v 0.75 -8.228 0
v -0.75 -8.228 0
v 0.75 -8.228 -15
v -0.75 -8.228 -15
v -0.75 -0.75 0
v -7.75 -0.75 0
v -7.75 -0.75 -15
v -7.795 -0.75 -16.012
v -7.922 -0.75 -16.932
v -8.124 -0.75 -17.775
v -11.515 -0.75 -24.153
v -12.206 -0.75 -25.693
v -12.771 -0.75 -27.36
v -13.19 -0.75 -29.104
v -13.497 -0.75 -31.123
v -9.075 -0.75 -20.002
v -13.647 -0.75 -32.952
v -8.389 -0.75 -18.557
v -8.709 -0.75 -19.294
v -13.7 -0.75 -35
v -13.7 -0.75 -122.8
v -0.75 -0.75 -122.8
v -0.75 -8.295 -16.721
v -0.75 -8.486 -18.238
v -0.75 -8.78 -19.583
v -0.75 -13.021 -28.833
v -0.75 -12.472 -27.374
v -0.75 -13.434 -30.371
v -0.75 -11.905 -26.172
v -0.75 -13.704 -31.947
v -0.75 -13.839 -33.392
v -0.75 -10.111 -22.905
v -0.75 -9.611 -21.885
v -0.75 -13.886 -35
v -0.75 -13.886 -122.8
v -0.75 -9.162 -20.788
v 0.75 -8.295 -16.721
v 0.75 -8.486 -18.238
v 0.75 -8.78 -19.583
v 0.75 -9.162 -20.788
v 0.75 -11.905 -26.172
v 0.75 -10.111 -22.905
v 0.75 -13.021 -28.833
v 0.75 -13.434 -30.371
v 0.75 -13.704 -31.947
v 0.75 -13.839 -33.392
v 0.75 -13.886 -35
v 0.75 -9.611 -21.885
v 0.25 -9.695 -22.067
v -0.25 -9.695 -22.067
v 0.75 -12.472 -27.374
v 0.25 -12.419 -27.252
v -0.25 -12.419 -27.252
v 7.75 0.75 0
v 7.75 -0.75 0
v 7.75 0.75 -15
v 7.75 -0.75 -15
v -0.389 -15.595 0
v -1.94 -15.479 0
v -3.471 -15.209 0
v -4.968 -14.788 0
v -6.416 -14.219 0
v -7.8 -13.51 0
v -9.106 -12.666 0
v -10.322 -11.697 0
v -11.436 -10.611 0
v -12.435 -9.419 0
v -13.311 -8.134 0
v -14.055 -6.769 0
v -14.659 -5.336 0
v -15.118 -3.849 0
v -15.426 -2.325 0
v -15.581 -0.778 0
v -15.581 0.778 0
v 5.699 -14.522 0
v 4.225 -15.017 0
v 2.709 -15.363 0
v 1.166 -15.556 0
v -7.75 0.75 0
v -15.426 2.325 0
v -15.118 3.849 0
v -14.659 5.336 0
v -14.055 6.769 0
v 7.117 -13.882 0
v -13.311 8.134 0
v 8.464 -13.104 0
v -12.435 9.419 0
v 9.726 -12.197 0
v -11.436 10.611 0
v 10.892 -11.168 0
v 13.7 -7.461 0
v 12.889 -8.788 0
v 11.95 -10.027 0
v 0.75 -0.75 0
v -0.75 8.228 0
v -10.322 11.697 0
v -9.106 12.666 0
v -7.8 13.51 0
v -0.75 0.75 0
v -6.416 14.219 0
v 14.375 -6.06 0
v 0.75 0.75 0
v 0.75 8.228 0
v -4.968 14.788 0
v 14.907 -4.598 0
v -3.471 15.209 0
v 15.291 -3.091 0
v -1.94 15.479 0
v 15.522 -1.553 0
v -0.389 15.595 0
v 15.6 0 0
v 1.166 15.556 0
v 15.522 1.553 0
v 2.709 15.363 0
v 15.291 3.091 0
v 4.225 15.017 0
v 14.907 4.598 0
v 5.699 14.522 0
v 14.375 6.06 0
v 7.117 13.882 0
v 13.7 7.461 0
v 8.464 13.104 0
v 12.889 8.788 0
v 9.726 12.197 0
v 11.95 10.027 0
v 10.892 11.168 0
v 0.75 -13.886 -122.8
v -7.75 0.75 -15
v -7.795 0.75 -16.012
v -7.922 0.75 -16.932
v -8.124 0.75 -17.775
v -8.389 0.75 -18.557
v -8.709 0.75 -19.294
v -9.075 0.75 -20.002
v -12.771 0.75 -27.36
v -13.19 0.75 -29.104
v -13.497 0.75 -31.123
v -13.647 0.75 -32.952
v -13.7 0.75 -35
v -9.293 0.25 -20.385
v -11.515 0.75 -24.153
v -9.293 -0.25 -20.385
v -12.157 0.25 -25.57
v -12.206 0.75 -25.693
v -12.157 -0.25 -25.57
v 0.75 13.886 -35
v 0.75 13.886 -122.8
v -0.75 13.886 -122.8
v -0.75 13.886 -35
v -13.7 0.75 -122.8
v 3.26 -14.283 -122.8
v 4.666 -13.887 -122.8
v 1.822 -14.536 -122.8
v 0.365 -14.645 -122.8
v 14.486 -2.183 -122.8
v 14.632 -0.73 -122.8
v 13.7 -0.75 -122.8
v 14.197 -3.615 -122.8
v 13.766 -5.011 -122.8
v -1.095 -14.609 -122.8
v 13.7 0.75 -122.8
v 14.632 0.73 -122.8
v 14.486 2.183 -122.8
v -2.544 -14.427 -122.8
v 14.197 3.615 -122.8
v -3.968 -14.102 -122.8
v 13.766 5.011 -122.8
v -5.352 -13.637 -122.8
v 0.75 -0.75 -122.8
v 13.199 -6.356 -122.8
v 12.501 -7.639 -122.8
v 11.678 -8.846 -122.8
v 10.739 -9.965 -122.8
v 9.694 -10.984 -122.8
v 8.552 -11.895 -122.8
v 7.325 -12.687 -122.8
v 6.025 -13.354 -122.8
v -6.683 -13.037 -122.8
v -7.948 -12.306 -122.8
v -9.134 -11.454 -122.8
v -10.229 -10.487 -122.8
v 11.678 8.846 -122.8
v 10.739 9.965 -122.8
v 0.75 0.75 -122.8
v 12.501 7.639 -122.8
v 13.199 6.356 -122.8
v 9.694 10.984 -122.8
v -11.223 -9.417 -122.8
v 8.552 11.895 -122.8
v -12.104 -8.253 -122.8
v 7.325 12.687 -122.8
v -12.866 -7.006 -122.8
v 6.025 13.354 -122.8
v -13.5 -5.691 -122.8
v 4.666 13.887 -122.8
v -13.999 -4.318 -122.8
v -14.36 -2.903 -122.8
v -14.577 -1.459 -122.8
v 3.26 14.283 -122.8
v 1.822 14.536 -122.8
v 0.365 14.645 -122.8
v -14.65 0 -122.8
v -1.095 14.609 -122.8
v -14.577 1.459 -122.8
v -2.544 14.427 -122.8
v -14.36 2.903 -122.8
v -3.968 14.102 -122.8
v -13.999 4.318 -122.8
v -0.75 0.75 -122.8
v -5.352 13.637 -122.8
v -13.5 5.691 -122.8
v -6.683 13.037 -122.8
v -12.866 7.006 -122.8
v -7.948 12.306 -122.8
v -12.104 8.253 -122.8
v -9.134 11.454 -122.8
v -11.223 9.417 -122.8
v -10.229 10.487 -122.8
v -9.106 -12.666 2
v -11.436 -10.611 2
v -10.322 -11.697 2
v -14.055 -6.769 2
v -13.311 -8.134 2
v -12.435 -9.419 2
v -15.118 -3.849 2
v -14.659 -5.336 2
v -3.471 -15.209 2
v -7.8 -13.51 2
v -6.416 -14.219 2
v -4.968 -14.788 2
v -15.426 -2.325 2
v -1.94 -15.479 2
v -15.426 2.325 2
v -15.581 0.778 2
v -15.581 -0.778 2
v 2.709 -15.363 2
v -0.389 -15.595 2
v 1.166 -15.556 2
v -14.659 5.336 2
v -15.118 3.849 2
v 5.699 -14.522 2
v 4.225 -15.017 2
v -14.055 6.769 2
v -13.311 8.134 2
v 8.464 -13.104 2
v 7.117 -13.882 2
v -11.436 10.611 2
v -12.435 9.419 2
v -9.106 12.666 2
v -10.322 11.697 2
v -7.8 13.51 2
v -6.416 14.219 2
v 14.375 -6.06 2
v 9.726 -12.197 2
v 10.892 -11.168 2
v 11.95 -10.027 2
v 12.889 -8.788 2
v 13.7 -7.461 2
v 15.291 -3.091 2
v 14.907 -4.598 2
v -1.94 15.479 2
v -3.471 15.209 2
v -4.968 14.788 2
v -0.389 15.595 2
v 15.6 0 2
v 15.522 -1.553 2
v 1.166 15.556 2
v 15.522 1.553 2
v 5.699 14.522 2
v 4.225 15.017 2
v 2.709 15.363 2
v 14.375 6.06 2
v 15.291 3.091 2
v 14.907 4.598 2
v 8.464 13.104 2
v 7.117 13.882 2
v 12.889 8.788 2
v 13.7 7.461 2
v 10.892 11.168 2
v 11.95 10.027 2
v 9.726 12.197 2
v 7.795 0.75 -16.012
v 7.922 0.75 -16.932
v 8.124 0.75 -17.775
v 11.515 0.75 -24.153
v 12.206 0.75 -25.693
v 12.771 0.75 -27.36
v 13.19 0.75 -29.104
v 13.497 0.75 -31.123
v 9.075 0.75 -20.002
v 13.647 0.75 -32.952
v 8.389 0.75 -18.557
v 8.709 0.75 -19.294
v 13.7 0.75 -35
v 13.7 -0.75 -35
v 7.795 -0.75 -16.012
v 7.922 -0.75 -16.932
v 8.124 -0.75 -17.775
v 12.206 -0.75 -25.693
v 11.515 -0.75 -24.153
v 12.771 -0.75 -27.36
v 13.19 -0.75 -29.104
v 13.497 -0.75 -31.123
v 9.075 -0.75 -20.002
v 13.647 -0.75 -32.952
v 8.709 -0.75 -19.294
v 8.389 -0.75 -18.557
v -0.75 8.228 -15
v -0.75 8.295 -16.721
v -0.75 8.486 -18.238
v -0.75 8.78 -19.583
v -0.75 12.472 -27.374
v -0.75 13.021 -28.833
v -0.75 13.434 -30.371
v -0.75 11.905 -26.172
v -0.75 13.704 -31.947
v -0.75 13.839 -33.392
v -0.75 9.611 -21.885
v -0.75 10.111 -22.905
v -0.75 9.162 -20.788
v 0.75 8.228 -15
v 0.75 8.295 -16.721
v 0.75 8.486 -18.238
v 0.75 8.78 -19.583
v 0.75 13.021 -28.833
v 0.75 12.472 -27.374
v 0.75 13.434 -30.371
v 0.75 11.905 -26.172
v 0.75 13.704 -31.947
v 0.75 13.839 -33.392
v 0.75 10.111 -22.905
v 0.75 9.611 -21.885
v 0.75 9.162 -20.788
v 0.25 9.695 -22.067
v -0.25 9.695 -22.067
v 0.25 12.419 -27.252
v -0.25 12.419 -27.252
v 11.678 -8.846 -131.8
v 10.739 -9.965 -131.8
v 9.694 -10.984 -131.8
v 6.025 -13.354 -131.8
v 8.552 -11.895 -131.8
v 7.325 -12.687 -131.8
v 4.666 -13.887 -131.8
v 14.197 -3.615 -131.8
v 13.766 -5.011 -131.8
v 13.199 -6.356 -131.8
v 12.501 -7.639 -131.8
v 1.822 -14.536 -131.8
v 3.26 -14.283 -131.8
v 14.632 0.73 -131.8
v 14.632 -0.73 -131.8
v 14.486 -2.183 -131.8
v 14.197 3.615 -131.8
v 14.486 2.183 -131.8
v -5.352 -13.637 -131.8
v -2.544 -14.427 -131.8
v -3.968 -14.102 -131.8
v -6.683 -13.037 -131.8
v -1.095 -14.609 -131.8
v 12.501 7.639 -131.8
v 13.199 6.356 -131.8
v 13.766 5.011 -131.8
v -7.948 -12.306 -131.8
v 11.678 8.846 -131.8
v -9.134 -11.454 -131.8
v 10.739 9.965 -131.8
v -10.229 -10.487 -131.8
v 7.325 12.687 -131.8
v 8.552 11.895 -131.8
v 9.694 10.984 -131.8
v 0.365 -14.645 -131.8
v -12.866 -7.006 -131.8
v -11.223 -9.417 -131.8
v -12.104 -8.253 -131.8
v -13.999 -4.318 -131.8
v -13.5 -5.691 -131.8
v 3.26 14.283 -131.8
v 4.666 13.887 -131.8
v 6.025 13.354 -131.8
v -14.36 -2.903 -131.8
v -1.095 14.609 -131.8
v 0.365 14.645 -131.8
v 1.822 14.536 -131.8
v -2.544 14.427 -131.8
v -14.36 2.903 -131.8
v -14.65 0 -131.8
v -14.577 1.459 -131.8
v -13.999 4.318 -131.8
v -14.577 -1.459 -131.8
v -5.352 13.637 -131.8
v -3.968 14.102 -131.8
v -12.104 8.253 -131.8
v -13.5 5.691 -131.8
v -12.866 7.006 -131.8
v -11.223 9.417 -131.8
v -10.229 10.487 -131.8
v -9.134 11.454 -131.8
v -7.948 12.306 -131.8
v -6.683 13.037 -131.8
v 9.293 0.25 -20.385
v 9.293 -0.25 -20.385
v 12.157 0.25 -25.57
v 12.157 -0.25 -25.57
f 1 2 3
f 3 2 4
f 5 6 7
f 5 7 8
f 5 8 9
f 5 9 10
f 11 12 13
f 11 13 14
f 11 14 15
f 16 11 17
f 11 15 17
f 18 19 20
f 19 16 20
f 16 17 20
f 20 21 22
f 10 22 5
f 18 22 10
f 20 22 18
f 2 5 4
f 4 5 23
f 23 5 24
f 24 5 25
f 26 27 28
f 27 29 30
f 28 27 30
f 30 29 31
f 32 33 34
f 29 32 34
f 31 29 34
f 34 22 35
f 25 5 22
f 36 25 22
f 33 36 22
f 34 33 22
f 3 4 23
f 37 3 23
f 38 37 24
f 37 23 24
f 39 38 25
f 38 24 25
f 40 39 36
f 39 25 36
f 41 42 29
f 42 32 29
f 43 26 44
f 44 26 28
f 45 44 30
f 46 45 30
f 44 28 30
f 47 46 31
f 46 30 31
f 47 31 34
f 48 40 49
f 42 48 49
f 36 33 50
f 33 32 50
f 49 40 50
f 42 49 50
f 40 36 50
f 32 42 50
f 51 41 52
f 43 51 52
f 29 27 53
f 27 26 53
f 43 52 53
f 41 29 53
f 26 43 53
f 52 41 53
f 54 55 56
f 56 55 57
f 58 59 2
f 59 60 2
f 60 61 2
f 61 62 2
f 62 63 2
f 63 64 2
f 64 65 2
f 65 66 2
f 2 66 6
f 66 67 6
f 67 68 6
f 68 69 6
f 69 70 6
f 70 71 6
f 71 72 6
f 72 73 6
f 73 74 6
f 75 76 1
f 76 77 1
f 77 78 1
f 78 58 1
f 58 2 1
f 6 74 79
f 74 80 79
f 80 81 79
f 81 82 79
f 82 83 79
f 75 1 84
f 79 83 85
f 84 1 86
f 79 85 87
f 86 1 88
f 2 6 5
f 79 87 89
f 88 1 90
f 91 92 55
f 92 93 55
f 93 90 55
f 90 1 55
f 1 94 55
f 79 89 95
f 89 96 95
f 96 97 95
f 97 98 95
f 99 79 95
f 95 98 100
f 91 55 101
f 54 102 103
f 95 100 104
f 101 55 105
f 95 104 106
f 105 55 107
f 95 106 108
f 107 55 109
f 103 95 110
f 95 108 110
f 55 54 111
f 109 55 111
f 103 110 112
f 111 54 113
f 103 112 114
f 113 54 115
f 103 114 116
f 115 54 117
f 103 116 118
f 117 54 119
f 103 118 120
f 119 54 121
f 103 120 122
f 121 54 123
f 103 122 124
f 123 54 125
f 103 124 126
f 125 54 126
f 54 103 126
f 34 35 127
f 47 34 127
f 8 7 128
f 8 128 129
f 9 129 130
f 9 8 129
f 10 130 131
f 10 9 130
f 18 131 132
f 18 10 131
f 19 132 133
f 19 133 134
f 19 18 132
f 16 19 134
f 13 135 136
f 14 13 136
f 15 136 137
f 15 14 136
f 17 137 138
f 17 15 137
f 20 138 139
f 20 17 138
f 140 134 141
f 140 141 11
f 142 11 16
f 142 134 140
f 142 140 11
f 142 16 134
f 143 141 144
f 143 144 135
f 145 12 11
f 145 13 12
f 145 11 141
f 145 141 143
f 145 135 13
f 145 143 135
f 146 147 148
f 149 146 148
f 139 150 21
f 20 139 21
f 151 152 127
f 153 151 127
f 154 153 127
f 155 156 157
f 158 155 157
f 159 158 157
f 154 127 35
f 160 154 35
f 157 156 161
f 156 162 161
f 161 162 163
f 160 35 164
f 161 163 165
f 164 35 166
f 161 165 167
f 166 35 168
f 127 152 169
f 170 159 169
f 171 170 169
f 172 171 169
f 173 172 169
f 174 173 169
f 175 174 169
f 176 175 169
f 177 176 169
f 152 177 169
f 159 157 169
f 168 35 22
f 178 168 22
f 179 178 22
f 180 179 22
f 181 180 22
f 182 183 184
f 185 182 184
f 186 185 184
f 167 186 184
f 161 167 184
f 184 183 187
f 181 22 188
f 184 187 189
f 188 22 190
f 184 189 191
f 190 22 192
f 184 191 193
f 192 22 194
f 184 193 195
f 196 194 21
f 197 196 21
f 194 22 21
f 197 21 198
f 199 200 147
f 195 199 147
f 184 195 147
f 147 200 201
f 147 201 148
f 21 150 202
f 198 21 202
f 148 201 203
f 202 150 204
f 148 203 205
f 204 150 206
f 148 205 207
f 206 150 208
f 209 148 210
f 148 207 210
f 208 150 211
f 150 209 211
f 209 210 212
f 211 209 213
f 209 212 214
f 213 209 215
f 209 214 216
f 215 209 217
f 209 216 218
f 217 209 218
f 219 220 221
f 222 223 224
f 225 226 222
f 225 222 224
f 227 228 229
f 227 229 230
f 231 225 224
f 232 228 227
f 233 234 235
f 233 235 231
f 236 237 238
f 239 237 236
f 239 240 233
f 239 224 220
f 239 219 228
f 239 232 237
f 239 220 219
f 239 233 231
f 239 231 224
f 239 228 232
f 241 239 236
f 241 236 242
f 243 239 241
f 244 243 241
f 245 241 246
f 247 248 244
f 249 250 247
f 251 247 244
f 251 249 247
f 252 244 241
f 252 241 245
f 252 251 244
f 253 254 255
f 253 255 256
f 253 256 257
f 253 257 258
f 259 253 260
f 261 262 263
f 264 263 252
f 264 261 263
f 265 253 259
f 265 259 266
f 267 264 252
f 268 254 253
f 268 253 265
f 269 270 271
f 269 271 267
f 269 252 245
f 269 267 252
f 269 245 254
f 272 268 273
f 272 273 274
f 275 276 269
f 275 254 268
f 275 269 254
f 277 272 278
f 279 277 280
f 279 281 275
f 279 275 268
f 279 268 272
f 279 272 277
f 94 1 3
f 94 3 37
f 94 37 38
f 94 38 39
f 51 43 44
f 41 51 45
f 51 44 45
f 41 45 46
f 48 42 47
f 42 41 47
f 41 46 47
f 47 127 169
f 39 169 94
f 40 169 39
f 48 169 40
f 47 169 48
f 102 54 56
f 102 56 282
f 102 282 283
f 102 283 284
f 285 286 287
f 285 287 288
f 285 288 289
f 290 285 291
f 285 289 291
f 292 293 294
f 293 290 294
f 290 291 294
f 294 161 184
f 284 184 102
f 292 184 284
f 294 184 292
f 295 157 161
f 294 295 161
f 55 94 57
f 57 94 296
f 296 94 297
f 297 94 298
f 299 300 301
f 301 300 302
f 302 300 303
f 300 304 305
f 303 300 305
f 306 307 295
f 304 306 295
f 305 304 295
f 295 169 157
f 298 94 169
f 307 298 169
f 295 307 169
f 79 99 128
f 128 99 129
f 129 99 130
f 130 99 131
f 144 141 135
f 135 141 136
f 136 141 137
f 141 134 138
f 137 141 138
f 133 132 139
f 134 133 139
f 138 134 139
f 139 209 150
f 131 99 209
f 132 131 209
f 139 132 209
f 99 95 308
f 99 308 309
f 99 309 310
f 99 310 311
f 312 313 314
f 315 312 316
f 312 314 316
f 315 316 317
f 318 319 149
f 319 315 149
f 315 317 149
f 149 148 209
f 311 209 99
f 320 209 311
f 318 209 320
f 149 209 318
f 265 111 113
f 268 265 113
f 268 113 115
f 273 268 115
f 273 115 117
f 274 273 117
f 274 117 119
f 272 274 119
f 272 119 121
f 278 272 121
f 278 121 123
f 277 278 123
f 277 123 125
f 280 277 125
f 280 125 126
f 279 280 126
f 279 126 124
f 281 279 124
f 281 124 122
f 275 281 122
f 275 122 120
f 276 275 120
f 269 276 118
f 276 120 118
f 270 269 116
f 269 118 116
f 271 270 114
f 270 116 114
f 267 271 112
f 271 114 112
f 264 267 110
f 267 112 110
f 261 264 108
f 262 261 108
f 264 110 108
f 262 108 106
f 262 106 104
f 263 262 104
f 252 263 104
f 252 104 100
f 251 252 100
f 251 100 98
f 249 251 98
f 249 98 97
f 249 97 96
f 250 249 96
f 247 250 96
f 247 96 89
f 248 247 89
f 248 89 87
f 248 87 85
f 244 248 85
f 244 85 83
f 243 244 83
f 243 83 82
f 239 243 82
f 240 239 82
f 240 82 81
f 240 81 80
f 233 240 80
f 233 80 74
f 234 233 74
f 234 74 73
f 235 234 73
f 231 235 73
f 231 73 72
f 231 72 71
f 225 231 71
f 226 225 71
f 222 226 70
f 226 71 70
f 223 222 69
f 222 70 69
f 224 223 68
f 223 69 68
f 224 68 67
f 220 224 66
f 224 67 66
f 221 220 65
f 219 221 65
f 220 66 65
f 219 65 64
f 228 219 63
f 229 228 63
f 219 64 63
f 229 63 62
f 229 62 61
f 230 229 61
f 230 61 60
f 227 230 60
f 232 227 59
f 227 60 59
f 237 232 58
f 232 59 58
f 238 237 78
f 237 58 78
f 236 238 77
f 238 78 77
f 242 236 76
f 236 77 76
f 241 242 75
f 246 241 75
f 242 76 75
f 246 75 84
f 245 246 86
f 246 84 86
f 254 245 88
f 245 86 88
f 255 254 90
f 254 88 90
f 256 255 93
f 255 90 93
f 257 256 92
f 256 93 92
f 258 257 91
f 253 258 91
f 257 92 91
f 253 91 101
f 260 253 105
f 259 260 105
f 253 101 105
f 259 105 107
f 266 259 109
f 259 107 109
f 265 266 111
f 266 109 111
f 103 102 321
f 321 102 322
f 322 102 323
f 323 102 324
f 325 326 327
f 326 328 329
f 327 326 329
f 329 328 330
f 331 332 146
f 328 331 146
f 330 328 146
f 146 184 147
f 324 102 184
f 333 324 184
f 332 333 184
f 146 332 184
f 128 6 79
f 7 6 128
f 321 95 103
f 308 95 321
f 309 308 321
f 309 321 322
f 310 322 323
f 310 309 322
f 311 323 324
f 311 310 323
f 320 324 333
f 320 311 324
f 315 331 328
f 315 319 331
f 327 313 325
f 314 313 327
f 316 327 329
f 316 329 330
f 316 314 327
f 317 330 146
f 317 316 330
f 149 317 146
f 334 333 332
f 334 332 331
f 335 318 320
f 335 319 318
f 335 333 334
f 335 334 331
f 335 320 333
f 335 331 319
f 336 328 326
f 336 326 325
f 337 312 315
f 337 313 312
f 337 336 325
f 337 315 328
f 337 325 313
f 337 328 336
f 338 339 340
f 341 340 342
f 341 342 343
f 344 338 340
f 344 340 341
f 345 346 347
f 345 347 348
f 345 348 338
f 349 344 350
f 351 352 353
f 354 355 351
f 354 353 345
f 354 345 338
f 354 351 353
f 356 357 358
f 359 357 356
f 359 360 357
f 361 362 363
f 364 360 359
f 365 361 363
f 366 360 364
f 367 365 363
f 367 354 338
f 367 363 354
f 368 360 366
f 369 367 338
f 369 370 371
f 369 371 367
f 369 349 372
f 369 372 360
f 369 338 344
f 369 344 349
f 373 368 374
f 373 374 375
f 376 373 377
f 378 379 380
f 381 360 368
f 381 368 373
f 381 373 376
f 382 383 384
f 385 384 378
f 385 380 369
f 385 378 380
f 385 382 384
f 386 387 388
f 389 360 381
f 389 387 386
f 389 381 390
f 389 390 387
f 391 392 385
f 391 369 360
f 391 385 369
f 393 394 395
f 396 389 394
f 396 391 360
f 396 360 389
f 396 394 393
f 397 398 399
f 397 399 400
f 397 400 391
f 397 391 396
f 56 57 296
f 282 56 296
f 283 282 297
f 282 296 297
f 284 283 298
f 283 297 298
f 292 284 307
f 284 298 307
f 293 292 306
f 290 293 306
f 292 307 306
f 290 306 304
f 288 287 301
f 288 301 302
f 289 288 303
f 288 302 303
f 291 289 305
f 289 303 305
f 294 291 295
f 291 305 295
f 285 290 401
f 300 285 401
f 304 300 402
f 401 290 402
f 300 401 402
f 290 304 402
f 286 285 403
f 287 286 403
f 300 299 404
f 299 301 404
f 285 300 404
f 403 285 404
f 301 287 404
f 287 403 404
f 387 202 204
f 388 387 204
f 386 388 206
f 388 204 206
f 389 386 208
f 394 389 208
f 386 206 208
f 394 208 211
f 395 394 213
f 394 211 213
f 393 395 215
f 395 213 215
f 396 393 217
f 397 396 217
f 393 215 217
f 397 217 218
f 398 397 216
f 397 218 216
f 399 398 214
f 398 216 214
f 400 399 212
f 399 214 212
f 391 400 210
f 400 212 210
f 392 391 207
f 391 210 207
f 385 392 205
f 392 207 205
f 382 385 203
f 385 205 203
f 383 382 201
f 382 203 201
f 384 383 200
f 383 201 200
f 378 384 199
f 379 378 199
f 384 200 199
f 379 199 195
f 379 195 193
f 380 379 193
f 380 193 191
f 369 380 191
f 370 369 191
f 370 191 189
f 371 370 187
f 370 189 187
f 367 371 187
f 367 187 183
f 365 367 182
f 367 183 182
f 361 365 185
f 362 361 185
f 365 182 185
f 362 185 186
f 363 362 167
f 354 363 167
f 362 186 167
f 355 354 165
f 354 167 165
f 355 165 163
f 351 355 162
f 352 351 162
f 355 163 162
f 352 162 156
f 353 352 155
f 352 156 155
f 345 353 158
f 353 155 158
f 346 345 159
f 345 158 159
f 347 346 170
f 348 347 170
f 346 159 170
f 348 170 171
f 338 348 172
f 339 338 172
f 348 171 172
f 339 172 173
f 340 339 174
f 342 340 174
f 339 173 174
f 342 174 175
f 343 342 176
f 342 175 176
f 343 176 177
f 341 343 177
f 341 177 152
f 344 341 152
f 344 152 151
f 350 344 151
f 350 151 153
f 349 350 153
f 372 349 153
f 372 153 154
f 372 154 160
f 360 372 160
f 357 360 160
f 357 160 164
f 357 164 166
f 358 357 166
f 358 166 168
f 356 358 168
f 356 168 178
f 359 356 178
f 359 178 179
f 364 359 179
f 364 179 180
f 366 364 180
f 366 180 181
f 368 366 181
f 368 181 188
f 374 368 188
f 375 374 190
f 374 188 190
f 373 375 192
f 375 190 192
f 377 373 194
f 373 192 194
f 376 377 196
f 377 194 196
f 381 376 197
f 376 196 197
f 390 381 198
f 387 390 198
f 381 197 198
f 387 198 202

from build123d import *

# Parameters (mm, degrees)
SKETCH1_R           = 15.6
BOSS_EXTRUDE1_DEPTH = 2
BOSS_EXTRUDE3_DEPTH = 122.8
SKETCH11_R          = 14.65
BOSS_EXTRUDE4_DEPTH = 9
CUT_EXTRUDE1_DEPTH  = 1.5
CUT_EXTRUDE2_DEPTH  = 1.5


with BuildPart() as part:
    # Sketch1 → Boss-Extrude1 (new body)
    with BuildSketch(Plane.XY):
        Circle(SKETCH1_R)
    extrude(amount=BOSS_EXTRUDE1_DEPTH)

    # Sketch5 → Boss-Extrude3 (add)
    with BuildSketch(Plane(origin=(0, 0, -122.8), x_dir=(-1, 0, 0), z_dir=(0, 0, -1))):
        Polygon((0.75, 0.75), (13.7, 0.75), (13.7, -0.75), (0.75, -0.75), (0.75, -13.886326313), (-0.75, -13.886326313), (-0.75, -0.75), (-13.7, -0.75), (-13.7, 0.75), (-0.75, 0.75), (-0.75, 13.886326313), (0.75, 13.886326313), align=None)
    extrude(amount=-BOSS_EXTRUDE3_DEPTH)

    # Sketch11 → Boss-Extrude4 (add)
    with BuildSketch(Plane(origin=(0, 0, -122.8), x_dir=(-1, 0, 0), z_dir=(0, 0, -1))):
        Circle(SKETCH11_R)
    extrude(amount=BOSS_EXTRUDE4_DEPTH)

    # Sketch12 → Cut-Extrude1 (cut)
    with BuildSketch(Plane.ZY.offset(0.75)):
        with BuildLine():
            Line((0, 8.228019132), (-15, 8.228019132))
            add(Edge.make_bspline(
                [(-15, 8.228019132), (-24.489612622, 8.228019132), (-24.489612622, 13.886326313), (-35, 13.886326313)],
                knots=[0, 0, 0, 0, 1, 1, 1, 1], degree=3))
            Line((-35, 13.886326313), (-35, 19.520904109))
            Line((-35, 19.520904109), (0, 19.520904109))
            Line((0, 19.520904109), (0, 8.228019132))
        make_face()
        with BuildLine():
            Line((0, -19.520904109), (0, -8.228019132))
            Line((0, -8.228019132), (-15, -8.228019132))
            add(Edge.make_bspline(
                [(-15, -8.228019132), (-24.489612622, -8.228019132), (-24.489612622, -13.886326313), (-35, -13.886326313)],
                knots=[0, 0, 0, 0, 1, 1, 1, 1], degree=3))
            Line((-35, -13.886326313), (-35, -19.520904109))
            Line((-35, -19.520904109), (0, -19.520904109))
        make_face()
    extrude(amount=-CUT_EXTRUDE1_DEPTH, mode=Mode.SUBTRACT)

    # Sketch13 → Cut-Extrude2 (cut)
    with BuildSketch(Plane.XZ.offset(0.75)):
        with BuildLine():
            Line((7.75, 0), (7.75, -15))
            add(Edge.make_bspline(
                [(7.75, -15), (7.75, -21.966675068), (13.7, -21.966675068), (13.7, -35)],
                knots=[0, 0, 0, 0, 1, 1, 1, 1], degree=3))
            Line((13.7, -35), (21.110657524, -35))
            Line((21.110657524, -35), (21.110657524, 0))
            Line((21.110657524, 0), (7.75, 0))
        make_face()
        with BuildLine():
            Line((-21.110657524, 0), (-7.75, 0))
            Line((-7.75, 0), (-7.75, -15))
            add(Edge.make_bspline(
                [(-7.75, -15), (-7.75, -21.966675068), (-13.7, -21.966675068), (-13.7, -35)],
                knots=[0, 0, 0, 0, 1, 1, 1, 1], degree=3))
            Line((-13.7, -35), (-21.110657524, -35))
            Line((-21.110657524, -35), (-21.110657524, 0))
        make_face()
    extrude(amount=-CUT_EXTRUDE2_DEPTH, mode=Mode.SUBTRACT)


solid = part.part
